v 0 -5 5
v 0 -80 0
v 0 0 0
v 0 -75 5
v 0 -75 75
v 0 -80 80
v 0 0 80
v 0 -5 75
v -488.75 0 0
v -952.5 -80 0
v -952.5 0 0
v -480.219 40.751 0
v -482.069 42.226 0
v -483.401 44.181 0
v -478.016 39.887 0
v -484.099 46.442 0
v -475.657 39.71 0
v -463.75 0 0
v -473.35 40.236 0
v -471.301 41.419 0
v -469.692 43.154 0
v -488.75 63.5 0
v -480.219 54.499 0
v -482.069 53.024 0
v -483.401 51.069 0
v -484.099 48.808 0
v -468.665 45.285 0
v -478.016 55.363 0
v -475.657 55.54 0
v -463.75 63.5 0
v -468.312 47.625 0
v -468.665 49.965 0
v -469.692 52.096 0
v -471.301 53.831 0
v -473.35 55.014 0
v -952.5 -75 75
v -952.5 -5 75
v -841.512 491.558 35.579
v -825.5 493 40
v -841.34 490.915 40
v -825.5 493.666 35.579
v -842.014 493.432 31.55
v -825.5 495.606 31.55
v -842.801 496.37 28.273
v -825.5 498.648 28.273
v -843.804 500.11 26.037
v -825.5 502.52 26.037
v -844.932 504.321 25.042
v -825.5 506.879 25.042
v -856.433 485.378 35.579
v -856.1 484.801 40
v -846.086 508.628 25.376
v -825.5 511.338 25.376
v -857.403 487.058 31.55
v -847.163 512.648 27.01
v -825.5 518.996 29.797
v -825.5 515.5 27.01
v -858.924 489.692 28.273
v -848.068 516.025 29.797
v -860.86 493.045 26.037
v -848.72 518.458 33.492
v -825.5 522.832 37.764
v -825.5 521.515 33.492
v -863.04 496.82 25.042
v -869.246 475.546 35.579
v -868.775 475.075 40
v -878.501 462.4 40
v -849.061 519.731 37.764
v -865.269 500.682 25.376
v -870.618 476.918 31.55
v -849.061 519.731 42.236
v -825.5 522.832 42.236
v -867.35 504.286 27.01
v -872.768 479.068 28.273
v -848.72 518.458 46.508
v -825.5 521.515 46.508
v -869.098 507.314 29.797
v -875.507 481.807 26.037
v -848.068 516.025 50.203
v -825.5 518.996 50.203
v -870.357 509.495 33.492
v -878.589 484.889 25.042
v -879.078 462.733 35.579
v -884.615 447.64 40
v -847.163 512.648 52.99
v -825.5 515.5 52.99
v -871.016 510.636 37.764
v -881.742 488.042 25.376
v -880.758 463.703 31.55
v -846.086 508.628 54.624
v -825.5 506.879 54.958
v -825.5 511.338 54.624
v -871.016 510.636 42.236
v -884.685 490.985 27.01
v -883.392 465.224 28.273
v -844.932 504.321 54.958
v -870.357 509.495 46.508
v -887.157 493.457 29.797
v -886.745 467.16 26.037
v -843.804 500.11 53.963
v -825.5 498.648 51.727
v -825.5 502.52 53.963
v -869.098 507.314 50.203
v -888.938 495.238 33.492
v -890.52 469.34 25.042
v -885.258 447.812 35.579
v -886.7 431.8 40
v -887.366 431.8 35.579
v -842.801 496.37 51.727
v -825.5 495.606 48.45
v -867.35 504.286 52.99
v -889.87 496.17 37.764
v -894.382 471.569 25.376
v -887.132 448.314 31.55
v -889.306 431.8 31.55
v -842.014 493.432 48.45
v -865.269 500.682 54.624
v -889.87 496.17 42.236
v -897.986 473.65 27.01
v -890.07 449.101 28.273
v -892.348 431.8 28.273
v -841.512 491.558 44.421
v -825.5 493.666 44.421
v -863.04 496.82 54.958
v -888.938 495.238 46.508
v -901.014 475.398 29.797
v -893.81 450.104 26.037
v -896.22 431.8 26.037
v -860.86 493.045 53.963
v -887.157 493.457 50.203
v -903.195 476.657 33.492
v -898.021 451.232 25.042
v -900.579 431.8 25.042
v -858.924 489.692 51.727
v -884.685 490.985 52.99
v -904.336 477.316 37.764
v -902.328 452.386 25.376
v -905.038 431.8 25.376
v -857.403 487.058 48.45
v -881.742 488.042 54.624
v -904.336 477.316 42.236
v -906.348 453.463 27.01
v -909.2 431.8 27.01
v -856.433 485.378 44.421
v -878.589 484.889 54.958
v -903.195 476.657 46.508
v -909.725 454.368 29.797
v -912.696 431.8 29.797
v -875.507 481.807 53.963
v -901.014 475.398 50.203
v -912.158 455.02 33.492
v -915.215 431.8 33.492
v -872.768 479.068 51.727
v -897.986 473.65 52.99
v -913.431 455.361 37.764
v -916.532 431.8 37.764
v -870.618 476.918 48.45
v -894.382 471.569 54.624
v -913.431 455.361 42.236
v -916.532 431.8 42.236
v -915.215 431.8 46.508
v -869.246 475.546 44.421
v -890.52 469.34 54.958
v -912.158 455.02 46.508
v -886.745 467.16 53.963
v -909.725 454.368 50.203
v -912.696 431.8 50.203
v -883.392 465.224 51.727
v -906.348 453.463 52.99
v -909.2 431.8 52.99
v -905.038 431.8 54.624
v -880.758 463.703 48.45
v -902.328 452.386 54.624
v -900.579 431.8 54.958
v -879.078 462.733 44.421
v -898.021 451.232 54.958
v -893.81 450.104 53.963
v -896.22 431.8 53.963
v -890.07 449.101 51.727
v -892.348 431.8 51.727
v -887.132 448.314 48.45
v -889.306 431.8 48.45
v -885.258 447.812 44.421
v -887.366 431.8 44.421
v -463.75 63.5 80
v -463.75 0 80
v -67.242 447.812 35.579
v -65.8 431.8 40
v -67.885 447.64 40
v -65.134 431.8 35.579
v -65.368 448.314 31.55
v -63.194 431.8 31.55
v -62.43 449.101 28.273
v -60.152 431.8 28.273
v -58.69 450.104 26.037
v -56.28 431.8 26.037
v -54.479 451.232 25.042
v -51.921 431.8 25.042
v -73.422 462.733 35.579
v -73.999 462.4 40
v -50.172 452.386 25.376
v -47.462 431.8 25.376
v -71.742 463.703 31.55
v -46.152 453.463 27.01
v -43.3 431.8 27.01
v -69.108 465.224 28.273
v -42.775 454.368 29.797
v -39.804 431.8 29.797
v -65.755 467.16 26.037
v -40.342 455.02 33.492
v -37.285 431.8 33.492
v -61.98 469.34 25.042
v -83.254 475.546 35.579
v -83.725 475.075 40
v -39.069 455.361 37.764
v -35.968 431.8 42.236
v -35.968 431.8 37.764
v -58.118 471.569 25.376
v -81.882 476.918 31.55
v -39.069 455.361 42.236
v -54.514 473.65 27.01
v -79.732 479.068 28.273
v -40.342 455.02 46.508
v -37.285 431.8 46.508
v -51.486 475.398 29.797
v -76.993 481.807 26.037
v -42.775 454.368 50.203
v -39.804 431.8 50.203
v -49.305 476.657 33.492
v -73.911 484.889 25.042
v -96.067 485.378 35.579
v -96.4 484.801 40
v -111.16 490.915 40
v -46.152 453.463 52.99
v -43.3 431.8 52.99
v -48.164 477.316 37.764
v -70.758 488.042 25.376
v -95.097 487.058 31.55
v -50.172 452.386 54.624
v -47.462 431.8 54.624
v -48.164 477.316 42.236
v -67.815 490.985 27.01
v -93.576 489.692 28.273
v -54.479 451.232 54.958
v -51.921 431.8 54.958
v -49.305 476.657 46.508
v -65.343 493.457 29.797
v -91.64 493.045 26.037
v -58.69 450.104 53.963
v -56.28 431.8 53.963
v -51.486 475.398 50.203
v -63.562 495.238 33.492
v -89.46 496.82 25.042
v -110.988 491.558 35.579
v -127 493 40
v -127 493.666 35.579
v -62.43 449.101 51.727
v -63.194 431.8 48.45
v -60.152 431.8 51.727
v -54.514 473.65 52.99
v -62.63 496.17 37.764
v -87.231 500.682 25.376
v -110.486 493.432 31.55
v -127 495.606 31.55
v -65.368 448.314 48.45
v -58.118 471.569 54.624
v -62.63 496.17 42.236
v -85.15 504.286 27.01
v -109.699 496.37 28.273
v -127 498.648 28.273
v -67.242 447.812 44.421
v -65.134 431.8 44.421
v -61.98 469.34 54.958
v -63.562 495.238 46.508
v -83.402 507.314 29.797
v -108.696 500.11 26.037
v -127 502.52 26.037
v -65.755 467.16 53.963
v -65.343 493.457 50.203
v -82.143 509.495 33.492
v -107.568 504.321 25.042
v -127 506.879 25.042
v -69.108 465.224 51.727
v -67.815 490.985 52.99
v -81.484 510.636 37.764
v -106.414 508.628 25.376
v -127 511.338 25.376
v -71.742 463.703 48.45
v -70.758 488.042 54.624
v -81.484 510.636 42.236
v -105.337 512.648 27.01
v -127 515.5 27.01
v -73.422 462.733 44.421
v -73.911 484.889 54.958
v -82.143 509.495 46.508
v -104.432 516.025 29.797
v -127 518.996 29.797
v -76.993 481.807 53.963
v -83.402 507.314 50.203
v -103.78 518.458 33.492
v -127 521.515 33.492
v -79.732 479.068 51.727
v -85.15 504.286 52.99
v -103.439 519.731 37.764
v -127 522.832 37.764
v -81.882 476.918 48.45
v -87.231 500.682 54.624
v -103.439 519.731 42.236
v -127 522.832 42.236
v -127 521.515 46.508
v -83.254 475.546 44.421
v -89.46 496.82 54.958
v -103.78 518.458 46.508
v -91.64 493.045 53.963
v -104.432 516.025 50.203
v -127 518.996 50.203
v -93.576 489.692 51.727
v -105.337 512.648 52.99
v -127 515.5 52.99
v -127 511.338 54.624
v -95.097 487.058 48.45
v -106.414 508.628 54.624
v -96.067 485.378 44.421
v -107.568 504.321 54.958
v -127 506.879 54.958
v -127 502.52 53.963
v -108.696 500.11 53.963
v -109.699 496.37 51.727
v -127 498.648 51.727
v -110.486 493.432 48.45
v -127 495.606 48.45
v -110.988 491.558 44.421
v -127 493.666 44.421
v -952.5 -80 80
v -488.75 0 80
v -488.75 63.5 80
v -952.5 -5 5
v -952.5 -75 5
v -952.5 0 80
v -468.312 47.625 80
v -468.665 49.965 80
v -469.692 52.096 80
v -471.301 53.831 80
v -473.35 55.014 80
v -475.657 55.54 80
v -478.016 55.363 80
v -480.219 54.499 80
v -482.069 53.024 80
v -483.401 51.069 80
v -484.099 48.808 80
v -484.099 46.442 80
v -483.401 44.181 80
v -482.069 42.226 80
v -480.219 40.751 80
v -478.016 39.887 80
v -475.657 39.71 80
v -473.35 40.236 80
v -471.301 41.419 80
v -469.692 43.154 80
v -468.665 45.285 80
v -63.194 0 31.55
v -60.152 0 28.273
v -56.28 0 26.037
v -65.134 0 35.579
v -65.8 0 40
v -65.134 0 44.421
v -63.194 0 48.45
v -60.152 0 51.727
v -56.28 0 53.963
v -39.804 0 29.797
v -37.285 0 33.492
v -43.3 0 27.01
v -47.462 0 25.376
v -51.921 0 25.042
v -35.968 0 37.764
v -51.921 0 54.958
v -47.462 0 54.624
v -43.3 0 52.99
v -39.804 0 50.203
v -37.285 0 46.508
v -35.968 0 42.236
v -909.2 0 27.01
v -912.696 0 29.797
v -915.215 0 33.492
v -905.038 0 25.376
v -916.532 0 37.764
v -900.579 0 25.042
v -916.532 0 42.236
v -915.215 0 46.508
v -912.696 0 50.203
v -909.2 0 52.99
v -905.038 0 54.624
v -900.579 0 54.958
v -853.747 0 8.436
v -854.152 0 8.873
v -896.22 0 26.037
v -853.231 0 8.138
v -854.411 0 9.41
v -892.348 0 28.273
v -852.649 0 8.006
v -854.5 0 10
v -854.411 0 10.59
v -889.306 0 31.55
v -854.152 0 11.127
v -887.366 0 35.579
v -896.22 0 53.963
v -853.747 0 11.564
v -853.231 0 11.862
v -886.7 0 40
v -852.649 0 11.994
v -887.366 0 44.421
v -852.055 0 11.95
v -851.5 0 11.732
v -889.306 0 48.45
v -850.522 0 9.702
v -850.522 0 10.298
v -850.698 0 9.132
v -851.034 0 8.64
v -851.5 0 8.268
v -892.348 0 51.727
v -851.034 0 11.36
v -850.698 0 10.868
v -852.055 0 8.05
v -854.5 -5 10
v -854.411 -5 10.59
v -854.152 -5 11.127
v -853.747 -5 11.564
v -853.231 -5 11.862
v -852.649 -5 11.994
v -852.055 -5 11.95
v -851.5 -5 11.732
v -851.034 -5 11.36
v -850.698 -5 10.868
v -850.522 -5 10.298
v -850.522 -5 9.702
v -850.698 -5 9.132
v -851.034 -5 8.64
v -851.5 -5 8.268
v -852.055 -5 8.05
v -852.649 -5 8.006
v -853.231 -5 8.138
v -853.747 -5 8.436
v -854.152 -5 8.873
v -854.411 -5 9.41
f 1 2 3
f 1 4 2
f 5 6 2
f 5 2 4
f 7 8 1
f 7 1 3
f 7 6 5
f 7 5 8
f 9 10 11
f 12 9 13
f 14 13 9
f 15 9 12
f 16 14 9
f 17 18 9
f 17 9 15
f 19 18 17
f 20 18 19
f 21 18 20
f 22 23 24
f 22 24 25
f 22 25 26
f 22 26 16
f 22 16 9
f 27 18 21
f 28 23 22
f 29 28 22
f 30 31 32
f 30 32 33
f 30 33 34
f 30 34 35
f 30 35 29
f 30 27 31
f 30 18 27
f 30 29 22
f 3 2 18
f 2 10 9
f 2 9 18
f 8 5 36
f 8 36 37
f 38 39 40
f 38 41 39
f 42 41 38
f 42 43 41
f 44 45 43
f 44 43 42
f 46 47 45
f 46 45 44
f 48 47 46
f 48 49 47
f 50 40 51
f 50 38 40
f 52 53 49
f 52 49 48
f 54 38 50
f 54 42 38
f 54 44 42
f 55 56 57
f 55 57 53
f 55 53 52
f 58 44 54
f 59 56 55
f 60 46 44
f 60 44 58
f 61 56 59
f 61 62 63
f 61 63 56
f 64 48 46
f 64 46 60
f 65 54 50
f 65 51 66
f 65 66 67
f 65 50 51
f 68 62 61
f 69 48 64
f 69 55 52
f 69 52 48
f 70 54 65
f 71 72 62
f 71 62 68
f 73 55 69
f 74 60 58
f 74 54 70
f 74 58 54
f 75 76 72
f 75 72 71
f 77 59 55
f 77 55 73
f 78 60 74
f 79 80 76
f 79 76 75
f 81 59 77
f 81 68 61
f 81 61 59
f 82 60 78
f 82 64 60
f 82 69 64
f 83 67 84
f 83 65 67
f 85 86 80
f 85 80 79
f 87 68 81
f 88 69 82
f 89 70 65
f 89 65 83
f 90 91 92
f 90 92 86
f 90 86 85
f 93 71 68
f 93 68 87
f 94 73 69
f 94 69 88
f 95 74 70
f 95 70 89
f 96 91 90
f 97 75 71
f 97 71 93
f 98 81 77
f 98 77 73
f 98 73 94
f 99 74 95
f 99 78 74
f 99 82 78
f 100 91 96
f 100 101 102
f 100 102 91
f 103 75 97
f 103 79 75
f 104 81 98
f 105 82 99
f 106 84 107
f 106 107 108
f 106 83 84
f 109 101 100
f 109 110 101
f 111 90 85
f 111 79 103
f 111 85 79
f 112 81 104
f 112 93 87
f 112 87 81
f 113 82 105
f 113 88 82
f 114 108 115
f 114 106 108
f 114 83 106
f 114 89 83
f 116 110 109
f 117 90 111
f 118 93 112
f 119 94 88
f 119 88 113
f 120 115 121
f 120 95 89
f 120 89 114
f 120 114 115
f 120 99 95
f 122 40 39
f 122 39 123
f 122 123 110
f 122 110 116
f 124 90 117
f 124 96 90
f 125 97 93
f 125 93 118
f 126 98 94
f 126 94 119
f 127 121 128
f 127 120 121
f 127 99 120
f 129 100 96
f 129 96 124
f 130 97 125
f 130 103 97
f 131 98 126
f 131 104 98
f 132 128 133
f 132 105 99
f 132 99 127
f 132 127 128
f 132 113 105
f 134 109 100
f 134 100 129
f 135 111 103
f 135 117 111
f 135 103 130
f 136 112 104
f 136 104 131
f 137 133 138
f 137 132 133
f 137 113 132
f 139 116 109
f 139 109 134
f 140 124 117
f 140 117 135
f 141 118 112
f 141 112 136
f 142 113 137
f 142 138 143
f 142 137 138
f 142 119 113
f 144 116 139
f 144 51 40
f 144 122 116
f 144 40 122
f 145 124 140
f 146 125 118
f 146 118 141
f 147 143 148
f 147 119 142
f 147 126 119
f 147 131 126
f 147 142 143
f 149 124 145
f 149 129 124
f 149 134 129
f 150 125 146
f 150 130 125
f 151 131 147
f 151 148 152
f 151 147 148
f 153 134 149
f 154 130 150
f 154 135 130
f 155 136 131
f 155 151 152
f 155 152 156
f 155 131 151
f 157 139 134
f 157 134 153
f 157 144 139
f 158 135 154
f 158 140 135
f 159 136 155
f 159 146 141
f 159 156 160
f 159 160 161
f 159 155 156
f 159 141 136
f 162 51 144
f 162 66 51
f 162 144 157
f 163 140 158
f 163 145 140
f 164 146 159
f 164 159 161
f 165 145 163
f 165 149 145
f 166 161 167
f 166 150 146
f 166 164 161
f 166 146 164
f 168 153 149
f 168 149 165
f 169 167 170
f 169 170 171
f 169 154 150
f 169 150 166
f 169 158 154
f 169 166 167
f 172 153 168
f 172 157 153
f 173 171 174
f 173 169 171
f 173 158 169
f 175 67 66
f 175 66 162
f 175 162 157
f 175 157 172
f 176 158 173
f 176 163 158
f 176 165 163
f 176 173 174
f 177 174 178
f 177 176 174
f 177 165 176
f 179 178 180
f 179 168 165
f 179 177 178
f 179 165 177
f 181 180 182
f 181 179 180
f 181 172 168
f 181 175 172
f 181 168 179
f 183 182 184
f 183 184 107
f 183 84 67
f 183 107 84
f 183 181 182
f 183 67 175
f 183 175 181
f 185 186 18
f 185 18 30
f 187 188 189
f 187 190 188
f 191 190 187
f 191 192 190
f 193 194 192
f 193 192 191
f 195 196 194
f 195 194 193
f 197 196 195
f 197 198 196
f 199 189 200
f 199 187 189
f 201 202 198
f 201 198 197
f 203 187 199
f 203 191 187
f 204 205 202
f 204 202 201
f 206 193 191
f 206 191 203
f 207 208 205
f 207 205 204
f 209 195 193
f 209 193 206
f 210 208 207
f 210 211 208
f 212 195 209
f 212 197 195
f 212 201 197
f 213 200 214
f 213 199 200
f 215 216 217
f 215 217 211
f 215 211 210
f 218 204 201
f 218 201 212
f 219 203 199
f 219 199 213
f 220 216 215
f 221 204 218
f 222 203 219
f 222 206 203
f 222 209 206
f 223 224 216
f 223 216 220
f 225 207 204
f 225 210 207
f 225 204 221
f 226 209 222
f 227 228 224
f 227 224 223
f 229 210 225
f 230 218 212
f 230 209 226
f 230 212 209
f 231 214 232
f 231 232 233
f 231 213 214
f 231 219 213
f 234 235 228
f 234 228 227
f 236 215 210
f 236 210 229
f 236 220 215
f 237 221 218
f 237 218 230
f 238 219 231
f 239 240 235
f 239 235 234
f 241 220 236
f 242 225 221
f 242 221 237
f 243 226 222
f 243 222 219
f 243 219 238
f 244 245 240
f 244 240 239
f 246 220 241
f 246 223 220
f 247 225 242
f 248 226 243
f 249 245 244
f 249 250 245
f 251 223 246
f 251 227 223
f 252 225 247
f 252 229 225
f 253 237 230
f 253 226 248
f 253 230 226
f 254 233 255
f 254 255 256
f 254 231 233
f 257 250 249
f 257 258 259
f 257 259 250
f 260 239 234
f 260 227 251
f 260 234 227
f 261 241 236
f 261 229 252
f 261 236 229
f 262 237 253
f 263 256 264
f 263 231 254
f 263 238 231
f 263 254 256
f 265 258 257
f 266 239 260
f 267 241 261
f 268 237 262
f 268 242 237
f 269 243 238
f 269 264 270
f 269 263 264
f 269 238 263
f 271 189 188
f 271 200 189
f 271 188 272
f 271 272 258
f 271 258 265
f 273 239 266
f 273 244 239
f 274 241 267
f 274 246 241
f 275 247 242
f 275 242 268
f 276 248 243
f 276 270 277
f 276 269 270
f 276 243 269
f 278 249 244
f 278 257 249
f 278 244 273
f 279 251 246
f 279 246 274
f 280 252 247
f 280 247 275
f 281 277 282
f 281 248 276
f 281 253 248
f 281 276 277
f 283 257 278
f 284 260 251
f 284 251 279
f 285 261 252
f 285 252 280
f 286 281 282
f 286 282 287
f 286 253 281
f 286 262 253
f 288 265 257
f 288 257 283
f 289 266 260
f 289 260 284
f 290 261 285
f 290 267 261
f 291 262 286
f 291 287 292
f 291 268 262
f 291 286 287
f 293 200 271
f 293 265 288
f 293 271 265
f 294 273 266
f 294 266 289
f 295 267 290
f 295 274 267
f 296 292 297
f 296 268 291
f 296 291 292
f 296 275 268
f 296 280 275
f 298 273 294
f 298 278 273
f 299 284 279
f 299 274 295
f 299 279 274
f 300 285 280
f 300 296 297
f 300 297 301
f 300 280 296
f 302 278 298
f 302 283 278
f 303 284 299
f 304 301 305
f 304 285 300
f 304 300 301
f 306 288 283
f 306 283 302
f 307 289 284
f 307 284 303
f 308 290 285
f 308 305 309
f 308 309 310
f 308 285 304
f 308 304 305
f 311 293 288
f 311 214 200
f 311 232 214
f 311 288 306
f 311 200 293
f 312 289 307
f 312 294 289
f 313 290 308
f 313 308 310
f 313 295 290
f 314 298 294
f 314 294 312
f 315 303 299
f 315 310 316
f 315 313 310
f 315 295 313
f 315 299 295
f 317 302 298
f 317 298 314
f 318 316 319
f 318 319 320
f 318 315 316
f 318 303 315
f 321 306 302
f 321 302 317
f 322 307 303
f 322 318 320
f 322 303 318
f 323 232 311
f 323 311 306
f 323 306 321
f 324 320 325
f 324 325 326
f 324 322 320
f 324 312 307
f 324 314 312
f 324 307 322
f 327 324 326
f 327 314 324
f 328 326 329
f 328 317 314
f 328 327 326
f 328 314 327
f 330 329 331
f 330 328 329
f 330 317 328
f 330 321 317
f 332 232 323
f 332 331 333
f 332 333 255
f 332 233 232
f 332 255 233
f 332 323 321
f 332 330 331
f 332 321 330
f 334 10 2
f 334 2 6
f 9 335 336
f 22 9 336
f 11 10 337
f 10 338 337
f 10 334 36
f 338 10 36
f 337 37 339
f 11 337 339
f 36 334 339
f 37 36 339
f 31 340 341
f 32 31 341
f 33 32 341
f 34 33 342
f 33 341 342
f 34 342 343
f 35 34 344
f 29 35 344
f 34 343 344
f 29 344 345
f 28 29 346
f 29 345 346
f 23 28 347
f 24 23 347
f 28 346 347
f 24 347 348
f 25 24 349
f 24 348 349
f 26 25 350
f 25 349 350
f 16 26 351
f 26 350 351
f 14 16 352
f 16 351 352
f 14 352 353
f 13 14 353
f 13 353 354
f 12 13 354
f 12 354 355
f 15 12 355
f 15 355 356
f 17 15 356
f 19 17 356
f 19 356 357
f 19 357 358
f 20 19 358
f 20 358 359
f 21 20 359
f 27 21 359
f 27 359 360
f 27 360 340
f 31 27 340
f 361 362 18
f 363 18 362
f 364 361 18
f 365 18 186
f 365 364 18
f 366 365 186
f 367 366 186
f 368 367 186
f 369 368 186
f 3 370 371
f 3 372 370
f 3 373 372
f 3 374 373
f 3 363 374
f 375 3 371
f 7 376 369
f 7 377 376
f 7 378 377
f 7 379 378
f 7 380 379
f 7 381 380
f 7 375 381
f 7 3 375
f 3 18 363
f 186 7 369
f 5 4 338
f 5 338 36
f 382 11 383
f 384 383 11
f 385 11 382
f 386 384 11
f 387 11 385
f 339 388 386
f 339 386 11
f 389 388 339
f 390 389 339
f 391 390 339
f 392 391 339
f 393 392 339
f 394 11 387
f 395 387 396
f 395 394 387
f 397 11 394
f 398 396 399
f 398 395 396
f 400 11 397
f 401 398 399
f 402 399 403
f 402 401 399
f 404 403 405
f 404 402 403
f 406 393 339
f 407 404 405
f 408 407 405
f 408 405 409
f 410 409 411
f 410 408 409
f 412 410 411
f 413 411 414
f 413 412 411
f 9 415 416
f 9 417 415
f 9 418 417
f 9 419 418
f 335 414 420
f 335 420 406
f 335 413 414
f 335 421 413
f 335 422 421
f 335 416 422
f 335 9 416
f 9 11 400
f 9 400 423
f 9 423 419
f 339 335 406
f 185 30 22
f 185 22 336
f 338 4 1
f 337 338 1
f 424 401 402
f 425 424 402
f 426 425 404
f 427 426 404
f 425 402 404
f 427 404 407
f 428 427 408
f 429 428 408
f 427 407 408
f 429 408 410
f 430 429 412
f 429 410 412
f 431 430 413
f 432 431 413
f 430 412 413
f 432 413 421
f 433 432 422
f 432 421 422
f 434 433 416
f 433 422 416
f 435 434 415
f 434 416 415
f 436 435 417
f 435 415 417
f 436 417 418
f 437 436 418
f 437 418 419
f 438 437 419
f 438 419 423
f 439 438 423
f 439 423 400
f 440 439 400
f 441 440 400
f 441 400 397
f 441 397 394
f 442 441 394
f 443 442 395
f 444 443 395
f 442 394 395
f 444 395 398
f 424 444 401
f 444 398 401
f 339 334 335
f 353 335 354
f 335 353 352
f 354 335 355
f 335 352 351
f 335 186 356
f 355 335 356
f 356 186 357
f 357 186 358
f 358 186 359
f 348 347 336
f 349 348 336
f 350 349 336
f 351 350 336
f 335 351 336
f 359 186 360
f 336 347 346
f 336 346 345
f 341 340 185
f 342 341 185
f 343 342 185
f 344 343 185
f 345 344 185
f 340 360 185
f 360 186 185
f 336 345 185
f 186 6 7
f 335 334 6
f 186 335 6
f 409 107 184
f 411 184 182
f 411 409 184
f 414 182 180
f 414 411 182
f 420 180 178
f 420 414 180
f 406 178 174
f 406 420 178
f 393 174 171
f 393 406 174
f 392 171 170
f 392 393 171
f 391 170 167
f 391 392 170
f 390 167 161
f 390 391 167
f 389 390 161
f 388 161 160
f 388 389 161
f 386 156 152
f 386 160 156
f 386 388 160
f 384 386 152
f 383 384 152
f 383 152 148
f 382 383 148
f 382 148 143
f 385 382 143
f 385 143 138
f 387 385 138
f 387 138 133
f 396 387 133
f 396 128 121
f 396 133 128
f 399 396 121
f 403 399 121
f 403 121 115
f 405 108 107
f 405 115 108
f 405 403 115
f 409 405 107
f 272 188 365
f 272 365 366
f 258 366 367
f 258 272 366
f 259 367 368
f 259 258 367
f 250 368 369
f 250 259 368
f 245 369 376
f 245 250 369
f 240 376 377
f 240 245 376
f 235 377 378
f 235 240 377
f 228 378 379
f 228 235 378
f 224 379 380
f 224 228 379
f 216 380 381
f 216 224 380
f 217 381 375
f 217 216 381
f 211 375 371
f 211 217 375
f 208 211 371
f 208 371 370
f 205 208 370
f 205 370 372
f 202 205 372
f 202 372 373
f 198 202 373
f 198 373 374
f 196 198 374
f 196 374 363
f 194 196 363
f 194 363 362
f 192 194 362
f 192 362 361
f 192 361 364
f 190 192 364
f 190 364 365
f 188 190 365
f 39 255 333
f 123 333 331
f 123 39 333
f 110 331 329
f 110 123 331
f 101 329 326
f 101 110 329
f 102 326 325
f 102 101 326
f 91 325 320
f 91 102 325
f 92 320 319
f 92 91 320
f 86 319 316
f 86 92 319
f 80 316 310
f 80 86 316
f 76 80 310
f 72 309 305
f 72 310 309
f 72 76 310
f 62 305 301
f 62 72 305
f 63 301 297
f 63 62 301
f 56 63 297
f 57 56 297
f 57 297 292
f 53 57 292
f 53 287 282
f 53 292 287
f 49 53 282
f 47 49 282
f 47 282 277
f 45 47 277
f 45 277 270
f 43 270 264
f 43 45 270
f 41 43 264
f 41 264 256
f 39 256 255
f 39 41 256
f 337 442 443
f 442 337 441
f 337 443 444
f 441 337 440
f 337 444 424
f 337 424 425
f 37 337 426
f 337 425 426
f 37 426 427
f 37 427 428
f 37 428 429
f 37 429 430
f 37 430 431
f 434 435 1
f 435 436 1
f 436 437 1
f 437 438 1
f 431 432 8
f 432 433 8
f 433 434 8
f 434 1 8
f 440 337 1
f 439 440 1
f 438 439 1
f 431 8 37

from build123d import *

# Parameters (mm, degrees)
F0_W      = 80
F0_H      = 80
F0_W_2    = 70
F0_H_2    = 70
F1_DEPTH  = 952.5
F4_R      = 15
F7_W      = 63.5
F7_H      = 80
F8_DEPTH  = 12.5
F9_R      = 7.9375
F10_DEPTH = 80.001
F11_R     = 2
F12_DEPTH = 5


with BuildPart() as f1:
    # F0 (on Right) → F1 (new body)
    with BuildSketch(Plane.YZ):
        with Locations((-40, 40)):
            Rectangle(F0_W, F0_H)
        with Locations((-40, 40)):
            Rectangle(F0_W_2, F0_H_2, mode=Mode.SUBTRACT)
    extrude(amount=-F1_DEPTH)

    # F5: sweep along a path in F3
    with BuildLine(Plane.XY.offset(40)) as f5_path:
        Line((-50.8, 0), (-50.8, 431.8))
        ThreePointArc((-50.8, 431.8), (-73.1184632736, 485.6815367264), (-127, 508))
        Line((-127, 508), (-825.5, 508))
        ThreePointArc((-825.5, 508), (-879.3815367264, 485.6815367264), (-901.7, 431.8))
        Line((-901.7, 431.8), (-901.7, 0))
    # F4 (on face) → F5 (sweep)
    with BuildSketch(Plane(origin=(0, 0, 0), x_dir=(-1, 0, 0), z_dir=(0, 1, 0))):
        with Locations((50.8, 40)):
            Circle(F4_R)
    sweep(path=f5_path.line)

    # F7 (on mid) → F8 (join, symmetric)
    with BuildSketch(Plane.YZ.offset(-476.25)):
        with Locations((31.75, 40)):
            Rectangle(F7_W, F7_H)
    extrude(amount=F8_DEPTH, both=True)

    # F9 (on face) → F10 (cut, through all)
    with BuildSketch(Plane.XY.offset(80)):
        with Locations((-476.25, 47.625)):
            Circle(F9_R)
    extrude(amount=-F10_DEPTH, mode=Mode.SUBTRACT)

    # F11 (on face) → F12 (cut, through all)
    with BuildSketch(Plane(origin=(0, 0, 0), x_dir=(-1, 0, 0), z_dir=(0, 1, 0))):
        with Locations((852.5, 10)):
            Circle(F11_R)
    extrude(amount=-F12_DEPTH, mode=Mode.SUBTRACT)


solid = f1.part
